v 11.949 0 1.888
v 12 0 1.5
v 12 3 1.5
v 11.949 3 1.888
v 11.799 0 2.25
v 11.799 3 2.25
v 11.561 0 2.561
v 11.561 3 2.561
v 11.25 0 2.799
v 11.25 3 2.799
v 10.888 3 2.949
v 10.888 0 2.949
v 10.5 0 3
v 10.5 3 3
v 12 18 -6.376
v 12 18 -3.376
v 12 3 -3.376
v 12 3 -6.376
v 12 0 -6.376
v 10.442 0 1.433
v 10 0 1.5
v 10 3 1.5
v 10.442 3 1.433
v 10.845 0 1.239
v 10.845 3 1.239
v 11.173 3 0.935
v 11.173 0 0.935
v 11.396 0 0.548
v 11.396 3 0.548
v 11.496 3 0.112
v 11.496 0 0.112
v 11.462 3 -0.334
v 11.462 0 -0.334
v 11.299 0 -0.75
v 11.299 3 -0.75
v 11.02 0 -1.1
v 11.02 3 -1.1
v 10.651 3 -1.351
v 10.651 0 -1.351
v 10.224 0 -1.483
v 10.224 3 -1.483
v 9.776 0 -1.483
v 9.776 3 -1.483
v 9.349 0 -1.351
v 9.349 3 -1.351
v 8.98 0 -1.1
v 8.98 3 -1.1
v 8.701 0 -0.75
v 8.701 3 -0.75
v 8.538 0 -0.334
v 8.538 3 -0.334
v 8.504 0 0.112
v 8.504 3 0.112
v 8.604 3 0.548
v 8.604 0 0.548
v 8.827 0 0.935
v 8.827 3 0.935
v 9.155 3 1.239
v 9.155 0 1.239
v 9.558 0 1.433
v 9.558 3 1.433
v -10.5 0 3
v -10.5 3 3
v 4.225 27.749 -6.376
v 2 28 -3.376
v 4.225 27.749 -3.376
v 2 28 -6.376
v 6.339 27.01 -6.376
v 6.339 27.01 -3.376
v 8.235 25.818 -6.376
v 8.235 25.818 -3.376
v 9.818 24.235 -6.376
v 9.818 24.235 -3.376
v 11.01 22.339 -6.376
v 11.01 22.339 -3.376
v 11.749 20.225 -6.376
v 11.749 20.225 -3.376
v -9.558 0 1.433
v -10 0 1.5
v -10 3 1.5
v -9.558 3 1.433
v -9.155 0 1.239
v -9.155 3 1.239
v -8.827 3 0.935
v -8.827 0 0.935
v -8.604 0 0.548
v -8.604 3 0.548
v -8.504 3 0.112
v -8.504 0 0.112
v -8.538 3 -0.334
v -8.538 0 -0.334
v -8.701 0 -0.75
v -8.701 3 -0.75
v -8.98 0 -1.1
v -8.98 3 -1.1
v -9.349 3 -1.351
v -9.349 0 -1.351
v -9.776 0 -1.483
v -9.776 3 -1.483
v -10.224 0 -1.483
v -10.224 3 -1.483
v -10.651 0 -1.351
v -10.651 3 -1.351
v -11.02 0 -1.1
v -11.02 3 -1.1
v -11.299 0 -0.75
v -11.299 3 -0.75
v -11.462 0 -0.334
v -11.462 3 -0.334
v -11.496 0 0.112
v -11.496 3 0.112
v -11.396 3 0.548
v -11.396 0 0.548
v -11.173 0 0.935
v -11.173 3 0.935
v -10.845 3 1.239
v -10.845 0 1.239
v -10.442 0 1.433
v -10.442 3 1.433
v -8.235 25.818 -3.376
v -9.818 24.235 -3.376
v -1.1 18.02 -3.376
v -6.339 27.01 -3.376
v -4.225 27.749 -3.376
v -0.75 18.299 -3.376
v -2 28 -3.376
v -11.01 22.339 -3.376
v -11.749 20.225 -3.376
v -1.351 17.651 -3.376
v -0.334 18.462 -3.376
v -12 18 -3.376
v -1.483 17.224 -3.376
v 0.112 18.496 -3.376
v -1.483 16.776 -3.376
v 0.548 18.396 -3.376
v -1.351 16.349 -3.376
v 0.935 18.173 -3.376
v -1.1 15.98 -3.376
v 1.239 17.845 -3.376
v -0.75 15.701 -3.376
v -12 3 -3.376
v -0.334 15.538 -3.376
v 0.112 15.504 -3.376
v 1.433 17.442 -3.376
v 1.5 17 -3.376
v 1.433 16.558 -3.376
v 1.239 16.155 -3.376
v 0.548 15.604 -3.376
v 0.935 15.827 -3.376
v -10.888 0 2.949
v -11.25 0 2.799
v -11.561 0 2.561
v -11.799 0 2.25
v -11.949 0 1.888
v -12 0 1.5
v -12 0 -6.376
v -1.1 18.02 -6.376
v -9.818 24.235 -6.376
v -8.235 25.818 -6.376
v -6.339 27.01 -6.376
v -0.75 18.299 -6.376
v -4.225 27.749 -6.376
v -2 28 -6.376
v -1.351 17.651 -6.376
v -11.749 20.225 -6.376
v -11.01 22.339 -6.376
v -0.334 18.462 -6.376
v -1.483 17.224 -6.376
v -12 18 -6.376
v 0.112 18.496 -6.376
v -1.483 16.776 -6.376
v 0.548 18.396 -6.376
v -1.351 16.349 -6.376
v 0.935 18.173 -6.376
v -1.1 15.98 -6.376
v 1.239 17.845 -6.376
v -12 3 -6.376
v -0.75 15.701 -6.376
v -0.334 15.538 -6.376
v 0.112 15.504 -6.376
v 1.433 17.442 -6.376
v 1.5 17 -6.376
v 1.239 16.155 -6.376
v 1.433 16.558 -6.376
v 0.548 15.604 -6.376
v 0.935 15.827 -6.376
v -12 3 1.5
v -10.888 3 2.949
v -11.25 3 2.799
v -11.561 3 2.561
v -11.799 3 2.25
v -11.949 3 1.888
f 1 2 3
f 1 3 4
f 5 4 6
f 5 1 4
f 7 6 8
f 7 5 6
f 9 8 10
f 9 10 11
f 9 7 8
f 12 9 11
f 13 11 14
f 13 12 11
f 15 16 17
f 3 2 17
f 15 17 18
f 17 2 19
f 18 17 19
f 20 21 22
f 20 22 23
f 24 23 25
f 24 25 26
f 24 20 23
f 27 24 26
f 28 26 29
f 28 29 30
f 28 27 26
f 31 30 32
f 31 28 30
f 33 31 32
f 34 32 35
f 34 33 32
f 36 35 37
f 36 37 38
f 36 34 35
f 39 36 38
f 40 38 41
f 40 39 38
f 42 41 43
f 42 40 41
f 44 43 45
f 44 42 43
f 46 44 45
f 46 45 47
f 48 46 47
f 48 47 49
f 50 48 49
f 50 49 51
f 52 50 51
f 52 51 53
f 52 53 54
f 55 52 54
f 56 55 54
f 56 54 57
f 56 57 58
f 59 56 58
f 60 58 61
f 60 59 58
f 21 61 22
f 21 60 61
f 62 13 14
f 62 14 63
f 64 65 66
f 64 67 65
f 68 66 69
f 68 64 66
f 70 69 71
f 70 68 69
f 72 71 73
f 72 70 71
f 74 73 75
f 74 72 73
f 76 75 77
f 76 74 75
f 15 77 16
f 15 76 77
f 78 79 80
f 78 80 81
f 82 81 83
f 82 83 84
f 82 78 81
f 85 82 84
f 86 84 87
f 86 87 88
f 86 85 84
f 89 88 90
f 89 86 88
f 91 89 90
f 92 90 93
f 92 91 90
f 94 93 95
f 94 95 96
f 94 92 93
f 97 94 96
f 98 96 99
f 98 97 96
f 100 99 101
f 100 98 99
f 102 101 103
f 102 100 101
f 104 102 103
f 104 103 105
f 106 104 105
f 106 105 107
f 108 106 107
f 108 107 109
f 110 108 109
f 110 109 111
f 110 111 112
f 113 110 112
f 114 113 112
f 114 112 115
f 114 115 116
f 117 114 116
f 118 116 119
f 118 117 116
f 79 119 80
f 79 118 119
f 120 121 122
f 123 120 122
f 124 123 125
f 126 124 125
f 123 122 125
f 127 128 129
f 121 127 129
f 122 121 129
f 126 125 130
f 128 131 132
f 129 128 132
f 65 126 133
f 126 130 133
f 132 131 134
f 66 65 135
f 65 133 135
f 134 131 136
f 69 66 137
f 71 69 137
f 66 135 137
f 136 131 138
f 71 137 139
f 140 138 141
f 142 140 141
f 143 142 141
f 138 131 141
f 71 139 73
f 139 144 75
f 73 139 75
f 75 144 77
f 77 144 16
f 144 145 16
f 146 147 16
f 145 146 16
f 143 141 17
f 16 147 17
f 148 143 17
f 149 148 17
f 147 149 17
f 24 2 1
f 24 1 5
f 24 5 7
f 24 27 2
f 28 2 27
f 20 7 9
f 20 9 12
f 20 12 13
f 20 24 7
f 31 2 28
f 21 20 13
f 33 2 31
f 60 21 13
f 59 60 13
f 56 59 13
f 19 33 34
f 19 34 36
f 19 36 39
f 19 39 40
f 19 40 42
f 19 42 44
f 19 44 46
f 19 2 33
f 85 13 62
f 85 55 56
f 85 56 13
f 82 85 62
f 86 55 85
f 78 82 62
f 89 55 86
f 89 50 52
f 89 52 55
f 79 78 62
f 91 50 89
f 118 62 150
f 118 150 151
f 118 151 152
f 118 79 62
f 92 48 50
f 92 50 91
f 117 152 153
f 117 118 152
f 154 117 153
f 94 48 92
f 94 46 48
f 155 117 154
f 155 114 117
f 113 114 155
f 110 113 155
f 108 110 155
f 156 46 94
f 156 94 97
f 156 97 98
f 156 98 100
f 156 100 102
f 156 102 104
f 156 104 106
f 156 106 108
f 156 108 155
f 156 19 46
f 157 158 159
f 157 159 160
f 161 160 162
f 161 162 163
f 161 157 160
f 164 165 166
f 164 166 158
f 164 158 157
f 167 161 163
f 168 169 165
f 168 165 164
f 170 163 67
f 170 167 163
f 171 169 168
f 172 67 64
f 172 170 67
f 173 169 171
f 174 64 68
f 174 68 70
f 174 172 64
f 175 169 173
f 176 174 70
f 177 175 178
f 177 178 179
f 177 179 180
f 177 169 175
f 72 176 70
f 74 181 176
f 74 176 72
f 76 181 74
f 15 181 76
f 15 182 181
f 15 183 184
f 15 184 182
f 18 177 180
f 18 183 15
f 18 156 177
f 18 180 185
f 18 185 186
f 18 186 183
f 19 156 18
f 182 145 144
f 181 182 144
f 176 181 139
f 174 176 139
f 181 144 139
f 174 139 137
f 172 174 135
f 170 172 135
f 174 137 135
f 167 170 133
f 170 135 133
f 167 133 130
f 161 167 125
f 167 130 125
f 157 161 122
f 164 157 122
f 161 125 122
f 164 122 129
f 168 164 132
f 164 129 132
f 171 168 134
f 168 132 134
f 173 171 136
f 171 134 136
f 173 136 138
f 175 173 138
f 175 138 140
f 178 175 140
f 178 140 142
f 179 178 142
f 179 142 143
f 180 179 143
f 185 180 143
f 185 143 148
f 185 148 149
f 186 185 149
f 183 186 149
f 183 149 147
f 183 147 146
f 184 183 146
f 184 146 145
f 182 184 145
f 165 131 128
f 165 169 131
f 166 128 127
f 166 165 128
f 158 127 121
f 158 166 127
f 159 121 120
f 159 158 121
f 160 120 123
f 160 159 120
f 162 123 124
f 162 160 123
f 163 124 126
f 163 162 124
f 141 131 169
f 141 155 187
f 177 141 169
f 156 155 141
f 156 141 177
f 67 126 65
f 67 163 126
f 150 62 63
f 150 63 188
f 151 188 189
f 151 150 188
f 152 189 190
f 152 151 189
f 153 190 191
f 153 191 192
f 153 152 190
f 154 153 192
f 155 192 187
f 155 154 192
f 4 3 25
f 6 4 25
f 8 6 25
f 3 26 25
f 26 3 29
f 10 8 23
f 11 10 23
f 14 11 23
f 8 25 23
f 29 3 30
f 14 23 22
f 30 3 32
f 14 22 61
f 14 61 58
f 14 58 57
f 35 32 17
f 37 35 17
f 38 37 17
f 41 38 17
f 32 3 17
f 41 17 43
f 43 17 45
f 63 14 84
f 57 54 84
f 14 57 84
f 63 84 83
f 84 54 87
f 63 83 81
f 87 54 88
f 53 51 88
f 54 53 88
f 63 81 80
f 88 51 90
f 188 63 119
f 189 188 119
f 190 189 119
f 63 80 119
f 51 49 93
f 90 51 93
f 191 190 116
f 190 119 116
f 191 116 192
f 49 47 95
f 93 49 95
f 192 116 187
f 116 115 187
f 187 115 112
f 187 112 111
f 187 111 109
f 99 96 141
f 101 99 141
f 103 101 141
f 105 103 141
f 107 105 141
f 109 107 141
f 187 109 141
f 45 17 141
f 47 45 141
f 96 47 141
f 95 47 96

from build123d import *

# Parameters (mm, degrees)
SKETCH1_W           = 24
SKETCH1_H           = 3.375672593
SKETCH1_R           = 1.5
BOSS_EXTRUDE1_DEPTH = 3
SKETCH2_W           = 24
SKETCH2_H           = 3
BOSS_EXTRUDE2_DEPTH = 25
FILLET1_R           = 10
SKETCH3_R           = 1.5
CUT_EXTRUDE1_DEPTH  = 32.123129679


with BuildPart() as part:
    # Sketch1 → Boss-Extrude1 (new body)
    # profile 1 of 2: a face of its own
    with BuildSketch(Plane(origin=(0, 0, 0), x_dir=(1, 0, 0), z_dir=(0, 1, 0))):
        with Locations((0, 4.687836297)):
            Rectangle(SKETCH1_W, SKETCH1_H)
    # profile 2 of 2: a face of its own
    with BuildSketch(Plane(origin=(0, 0, 0), x_dir=(1, 0, 0), z_dir=(0, 1, 0))):
        with BuildLine():
            ThreePointArc((-10.5, -3), (-11.560660172, -2.560660172), (-12, -1.5))
            Line((-12, -1.5), (-12, 3))
            Line((-12, 3), (12, 3))
            Line((12, 3), (12, -1.5))
            ThreePointArc((12, -1.5), (11.560660172, -2.560660172), (10.5, -3))
            Line((10.5, -3), (-10.5, -3))
        make_face()
        with Locations(Location((10, 0, 0), (0, 0, 270))):
            Circle(SKETCH1_R, mode=Mode.SUBTRACT)
        with Locations(Location((-10, 0, 0), (0, 0, 270))):
            Circle(SKETCH1_R, mode=Mode.SUBTRACT)
    extrude(amount=BOSS_EXTRUDE1_DEPTH)

    # Sketch2 → Boss-Extrude2 (add)
    with BuildSketch(Plane(origin=(0, 3, 0), x_dir=(1, 0, 0), z_dir=(0, 1, 0))):
        with Locations((0, 4.875672593)):
            Rectangle(SKETCH2_W, SKETCH2_H)
    extrude(amount=BOSS_EXTRUDE2_DEPTH)

    # Fillet1
    fillet1_edges = [part.edges().sort_by_distance(p)[0] for p in [
        (12, 28, -4.875672593),
        (-12, 28, -4.875672593),
    ]]
    fillet(fillet1_edges, radius=FILLET1_R)

    # Sketch3 → Cut-Extrude1 (cut, through all)
    with BuildSketch(Plane.XY.offset(-3.375672593)):
        with Locations((0, 17)):
            Circle(SKETCH3_R)
    extrude(amount=-CUT_EXTRUDE1_DEPTH, mode=Mode.SUBTRACT)


solid = part.part
